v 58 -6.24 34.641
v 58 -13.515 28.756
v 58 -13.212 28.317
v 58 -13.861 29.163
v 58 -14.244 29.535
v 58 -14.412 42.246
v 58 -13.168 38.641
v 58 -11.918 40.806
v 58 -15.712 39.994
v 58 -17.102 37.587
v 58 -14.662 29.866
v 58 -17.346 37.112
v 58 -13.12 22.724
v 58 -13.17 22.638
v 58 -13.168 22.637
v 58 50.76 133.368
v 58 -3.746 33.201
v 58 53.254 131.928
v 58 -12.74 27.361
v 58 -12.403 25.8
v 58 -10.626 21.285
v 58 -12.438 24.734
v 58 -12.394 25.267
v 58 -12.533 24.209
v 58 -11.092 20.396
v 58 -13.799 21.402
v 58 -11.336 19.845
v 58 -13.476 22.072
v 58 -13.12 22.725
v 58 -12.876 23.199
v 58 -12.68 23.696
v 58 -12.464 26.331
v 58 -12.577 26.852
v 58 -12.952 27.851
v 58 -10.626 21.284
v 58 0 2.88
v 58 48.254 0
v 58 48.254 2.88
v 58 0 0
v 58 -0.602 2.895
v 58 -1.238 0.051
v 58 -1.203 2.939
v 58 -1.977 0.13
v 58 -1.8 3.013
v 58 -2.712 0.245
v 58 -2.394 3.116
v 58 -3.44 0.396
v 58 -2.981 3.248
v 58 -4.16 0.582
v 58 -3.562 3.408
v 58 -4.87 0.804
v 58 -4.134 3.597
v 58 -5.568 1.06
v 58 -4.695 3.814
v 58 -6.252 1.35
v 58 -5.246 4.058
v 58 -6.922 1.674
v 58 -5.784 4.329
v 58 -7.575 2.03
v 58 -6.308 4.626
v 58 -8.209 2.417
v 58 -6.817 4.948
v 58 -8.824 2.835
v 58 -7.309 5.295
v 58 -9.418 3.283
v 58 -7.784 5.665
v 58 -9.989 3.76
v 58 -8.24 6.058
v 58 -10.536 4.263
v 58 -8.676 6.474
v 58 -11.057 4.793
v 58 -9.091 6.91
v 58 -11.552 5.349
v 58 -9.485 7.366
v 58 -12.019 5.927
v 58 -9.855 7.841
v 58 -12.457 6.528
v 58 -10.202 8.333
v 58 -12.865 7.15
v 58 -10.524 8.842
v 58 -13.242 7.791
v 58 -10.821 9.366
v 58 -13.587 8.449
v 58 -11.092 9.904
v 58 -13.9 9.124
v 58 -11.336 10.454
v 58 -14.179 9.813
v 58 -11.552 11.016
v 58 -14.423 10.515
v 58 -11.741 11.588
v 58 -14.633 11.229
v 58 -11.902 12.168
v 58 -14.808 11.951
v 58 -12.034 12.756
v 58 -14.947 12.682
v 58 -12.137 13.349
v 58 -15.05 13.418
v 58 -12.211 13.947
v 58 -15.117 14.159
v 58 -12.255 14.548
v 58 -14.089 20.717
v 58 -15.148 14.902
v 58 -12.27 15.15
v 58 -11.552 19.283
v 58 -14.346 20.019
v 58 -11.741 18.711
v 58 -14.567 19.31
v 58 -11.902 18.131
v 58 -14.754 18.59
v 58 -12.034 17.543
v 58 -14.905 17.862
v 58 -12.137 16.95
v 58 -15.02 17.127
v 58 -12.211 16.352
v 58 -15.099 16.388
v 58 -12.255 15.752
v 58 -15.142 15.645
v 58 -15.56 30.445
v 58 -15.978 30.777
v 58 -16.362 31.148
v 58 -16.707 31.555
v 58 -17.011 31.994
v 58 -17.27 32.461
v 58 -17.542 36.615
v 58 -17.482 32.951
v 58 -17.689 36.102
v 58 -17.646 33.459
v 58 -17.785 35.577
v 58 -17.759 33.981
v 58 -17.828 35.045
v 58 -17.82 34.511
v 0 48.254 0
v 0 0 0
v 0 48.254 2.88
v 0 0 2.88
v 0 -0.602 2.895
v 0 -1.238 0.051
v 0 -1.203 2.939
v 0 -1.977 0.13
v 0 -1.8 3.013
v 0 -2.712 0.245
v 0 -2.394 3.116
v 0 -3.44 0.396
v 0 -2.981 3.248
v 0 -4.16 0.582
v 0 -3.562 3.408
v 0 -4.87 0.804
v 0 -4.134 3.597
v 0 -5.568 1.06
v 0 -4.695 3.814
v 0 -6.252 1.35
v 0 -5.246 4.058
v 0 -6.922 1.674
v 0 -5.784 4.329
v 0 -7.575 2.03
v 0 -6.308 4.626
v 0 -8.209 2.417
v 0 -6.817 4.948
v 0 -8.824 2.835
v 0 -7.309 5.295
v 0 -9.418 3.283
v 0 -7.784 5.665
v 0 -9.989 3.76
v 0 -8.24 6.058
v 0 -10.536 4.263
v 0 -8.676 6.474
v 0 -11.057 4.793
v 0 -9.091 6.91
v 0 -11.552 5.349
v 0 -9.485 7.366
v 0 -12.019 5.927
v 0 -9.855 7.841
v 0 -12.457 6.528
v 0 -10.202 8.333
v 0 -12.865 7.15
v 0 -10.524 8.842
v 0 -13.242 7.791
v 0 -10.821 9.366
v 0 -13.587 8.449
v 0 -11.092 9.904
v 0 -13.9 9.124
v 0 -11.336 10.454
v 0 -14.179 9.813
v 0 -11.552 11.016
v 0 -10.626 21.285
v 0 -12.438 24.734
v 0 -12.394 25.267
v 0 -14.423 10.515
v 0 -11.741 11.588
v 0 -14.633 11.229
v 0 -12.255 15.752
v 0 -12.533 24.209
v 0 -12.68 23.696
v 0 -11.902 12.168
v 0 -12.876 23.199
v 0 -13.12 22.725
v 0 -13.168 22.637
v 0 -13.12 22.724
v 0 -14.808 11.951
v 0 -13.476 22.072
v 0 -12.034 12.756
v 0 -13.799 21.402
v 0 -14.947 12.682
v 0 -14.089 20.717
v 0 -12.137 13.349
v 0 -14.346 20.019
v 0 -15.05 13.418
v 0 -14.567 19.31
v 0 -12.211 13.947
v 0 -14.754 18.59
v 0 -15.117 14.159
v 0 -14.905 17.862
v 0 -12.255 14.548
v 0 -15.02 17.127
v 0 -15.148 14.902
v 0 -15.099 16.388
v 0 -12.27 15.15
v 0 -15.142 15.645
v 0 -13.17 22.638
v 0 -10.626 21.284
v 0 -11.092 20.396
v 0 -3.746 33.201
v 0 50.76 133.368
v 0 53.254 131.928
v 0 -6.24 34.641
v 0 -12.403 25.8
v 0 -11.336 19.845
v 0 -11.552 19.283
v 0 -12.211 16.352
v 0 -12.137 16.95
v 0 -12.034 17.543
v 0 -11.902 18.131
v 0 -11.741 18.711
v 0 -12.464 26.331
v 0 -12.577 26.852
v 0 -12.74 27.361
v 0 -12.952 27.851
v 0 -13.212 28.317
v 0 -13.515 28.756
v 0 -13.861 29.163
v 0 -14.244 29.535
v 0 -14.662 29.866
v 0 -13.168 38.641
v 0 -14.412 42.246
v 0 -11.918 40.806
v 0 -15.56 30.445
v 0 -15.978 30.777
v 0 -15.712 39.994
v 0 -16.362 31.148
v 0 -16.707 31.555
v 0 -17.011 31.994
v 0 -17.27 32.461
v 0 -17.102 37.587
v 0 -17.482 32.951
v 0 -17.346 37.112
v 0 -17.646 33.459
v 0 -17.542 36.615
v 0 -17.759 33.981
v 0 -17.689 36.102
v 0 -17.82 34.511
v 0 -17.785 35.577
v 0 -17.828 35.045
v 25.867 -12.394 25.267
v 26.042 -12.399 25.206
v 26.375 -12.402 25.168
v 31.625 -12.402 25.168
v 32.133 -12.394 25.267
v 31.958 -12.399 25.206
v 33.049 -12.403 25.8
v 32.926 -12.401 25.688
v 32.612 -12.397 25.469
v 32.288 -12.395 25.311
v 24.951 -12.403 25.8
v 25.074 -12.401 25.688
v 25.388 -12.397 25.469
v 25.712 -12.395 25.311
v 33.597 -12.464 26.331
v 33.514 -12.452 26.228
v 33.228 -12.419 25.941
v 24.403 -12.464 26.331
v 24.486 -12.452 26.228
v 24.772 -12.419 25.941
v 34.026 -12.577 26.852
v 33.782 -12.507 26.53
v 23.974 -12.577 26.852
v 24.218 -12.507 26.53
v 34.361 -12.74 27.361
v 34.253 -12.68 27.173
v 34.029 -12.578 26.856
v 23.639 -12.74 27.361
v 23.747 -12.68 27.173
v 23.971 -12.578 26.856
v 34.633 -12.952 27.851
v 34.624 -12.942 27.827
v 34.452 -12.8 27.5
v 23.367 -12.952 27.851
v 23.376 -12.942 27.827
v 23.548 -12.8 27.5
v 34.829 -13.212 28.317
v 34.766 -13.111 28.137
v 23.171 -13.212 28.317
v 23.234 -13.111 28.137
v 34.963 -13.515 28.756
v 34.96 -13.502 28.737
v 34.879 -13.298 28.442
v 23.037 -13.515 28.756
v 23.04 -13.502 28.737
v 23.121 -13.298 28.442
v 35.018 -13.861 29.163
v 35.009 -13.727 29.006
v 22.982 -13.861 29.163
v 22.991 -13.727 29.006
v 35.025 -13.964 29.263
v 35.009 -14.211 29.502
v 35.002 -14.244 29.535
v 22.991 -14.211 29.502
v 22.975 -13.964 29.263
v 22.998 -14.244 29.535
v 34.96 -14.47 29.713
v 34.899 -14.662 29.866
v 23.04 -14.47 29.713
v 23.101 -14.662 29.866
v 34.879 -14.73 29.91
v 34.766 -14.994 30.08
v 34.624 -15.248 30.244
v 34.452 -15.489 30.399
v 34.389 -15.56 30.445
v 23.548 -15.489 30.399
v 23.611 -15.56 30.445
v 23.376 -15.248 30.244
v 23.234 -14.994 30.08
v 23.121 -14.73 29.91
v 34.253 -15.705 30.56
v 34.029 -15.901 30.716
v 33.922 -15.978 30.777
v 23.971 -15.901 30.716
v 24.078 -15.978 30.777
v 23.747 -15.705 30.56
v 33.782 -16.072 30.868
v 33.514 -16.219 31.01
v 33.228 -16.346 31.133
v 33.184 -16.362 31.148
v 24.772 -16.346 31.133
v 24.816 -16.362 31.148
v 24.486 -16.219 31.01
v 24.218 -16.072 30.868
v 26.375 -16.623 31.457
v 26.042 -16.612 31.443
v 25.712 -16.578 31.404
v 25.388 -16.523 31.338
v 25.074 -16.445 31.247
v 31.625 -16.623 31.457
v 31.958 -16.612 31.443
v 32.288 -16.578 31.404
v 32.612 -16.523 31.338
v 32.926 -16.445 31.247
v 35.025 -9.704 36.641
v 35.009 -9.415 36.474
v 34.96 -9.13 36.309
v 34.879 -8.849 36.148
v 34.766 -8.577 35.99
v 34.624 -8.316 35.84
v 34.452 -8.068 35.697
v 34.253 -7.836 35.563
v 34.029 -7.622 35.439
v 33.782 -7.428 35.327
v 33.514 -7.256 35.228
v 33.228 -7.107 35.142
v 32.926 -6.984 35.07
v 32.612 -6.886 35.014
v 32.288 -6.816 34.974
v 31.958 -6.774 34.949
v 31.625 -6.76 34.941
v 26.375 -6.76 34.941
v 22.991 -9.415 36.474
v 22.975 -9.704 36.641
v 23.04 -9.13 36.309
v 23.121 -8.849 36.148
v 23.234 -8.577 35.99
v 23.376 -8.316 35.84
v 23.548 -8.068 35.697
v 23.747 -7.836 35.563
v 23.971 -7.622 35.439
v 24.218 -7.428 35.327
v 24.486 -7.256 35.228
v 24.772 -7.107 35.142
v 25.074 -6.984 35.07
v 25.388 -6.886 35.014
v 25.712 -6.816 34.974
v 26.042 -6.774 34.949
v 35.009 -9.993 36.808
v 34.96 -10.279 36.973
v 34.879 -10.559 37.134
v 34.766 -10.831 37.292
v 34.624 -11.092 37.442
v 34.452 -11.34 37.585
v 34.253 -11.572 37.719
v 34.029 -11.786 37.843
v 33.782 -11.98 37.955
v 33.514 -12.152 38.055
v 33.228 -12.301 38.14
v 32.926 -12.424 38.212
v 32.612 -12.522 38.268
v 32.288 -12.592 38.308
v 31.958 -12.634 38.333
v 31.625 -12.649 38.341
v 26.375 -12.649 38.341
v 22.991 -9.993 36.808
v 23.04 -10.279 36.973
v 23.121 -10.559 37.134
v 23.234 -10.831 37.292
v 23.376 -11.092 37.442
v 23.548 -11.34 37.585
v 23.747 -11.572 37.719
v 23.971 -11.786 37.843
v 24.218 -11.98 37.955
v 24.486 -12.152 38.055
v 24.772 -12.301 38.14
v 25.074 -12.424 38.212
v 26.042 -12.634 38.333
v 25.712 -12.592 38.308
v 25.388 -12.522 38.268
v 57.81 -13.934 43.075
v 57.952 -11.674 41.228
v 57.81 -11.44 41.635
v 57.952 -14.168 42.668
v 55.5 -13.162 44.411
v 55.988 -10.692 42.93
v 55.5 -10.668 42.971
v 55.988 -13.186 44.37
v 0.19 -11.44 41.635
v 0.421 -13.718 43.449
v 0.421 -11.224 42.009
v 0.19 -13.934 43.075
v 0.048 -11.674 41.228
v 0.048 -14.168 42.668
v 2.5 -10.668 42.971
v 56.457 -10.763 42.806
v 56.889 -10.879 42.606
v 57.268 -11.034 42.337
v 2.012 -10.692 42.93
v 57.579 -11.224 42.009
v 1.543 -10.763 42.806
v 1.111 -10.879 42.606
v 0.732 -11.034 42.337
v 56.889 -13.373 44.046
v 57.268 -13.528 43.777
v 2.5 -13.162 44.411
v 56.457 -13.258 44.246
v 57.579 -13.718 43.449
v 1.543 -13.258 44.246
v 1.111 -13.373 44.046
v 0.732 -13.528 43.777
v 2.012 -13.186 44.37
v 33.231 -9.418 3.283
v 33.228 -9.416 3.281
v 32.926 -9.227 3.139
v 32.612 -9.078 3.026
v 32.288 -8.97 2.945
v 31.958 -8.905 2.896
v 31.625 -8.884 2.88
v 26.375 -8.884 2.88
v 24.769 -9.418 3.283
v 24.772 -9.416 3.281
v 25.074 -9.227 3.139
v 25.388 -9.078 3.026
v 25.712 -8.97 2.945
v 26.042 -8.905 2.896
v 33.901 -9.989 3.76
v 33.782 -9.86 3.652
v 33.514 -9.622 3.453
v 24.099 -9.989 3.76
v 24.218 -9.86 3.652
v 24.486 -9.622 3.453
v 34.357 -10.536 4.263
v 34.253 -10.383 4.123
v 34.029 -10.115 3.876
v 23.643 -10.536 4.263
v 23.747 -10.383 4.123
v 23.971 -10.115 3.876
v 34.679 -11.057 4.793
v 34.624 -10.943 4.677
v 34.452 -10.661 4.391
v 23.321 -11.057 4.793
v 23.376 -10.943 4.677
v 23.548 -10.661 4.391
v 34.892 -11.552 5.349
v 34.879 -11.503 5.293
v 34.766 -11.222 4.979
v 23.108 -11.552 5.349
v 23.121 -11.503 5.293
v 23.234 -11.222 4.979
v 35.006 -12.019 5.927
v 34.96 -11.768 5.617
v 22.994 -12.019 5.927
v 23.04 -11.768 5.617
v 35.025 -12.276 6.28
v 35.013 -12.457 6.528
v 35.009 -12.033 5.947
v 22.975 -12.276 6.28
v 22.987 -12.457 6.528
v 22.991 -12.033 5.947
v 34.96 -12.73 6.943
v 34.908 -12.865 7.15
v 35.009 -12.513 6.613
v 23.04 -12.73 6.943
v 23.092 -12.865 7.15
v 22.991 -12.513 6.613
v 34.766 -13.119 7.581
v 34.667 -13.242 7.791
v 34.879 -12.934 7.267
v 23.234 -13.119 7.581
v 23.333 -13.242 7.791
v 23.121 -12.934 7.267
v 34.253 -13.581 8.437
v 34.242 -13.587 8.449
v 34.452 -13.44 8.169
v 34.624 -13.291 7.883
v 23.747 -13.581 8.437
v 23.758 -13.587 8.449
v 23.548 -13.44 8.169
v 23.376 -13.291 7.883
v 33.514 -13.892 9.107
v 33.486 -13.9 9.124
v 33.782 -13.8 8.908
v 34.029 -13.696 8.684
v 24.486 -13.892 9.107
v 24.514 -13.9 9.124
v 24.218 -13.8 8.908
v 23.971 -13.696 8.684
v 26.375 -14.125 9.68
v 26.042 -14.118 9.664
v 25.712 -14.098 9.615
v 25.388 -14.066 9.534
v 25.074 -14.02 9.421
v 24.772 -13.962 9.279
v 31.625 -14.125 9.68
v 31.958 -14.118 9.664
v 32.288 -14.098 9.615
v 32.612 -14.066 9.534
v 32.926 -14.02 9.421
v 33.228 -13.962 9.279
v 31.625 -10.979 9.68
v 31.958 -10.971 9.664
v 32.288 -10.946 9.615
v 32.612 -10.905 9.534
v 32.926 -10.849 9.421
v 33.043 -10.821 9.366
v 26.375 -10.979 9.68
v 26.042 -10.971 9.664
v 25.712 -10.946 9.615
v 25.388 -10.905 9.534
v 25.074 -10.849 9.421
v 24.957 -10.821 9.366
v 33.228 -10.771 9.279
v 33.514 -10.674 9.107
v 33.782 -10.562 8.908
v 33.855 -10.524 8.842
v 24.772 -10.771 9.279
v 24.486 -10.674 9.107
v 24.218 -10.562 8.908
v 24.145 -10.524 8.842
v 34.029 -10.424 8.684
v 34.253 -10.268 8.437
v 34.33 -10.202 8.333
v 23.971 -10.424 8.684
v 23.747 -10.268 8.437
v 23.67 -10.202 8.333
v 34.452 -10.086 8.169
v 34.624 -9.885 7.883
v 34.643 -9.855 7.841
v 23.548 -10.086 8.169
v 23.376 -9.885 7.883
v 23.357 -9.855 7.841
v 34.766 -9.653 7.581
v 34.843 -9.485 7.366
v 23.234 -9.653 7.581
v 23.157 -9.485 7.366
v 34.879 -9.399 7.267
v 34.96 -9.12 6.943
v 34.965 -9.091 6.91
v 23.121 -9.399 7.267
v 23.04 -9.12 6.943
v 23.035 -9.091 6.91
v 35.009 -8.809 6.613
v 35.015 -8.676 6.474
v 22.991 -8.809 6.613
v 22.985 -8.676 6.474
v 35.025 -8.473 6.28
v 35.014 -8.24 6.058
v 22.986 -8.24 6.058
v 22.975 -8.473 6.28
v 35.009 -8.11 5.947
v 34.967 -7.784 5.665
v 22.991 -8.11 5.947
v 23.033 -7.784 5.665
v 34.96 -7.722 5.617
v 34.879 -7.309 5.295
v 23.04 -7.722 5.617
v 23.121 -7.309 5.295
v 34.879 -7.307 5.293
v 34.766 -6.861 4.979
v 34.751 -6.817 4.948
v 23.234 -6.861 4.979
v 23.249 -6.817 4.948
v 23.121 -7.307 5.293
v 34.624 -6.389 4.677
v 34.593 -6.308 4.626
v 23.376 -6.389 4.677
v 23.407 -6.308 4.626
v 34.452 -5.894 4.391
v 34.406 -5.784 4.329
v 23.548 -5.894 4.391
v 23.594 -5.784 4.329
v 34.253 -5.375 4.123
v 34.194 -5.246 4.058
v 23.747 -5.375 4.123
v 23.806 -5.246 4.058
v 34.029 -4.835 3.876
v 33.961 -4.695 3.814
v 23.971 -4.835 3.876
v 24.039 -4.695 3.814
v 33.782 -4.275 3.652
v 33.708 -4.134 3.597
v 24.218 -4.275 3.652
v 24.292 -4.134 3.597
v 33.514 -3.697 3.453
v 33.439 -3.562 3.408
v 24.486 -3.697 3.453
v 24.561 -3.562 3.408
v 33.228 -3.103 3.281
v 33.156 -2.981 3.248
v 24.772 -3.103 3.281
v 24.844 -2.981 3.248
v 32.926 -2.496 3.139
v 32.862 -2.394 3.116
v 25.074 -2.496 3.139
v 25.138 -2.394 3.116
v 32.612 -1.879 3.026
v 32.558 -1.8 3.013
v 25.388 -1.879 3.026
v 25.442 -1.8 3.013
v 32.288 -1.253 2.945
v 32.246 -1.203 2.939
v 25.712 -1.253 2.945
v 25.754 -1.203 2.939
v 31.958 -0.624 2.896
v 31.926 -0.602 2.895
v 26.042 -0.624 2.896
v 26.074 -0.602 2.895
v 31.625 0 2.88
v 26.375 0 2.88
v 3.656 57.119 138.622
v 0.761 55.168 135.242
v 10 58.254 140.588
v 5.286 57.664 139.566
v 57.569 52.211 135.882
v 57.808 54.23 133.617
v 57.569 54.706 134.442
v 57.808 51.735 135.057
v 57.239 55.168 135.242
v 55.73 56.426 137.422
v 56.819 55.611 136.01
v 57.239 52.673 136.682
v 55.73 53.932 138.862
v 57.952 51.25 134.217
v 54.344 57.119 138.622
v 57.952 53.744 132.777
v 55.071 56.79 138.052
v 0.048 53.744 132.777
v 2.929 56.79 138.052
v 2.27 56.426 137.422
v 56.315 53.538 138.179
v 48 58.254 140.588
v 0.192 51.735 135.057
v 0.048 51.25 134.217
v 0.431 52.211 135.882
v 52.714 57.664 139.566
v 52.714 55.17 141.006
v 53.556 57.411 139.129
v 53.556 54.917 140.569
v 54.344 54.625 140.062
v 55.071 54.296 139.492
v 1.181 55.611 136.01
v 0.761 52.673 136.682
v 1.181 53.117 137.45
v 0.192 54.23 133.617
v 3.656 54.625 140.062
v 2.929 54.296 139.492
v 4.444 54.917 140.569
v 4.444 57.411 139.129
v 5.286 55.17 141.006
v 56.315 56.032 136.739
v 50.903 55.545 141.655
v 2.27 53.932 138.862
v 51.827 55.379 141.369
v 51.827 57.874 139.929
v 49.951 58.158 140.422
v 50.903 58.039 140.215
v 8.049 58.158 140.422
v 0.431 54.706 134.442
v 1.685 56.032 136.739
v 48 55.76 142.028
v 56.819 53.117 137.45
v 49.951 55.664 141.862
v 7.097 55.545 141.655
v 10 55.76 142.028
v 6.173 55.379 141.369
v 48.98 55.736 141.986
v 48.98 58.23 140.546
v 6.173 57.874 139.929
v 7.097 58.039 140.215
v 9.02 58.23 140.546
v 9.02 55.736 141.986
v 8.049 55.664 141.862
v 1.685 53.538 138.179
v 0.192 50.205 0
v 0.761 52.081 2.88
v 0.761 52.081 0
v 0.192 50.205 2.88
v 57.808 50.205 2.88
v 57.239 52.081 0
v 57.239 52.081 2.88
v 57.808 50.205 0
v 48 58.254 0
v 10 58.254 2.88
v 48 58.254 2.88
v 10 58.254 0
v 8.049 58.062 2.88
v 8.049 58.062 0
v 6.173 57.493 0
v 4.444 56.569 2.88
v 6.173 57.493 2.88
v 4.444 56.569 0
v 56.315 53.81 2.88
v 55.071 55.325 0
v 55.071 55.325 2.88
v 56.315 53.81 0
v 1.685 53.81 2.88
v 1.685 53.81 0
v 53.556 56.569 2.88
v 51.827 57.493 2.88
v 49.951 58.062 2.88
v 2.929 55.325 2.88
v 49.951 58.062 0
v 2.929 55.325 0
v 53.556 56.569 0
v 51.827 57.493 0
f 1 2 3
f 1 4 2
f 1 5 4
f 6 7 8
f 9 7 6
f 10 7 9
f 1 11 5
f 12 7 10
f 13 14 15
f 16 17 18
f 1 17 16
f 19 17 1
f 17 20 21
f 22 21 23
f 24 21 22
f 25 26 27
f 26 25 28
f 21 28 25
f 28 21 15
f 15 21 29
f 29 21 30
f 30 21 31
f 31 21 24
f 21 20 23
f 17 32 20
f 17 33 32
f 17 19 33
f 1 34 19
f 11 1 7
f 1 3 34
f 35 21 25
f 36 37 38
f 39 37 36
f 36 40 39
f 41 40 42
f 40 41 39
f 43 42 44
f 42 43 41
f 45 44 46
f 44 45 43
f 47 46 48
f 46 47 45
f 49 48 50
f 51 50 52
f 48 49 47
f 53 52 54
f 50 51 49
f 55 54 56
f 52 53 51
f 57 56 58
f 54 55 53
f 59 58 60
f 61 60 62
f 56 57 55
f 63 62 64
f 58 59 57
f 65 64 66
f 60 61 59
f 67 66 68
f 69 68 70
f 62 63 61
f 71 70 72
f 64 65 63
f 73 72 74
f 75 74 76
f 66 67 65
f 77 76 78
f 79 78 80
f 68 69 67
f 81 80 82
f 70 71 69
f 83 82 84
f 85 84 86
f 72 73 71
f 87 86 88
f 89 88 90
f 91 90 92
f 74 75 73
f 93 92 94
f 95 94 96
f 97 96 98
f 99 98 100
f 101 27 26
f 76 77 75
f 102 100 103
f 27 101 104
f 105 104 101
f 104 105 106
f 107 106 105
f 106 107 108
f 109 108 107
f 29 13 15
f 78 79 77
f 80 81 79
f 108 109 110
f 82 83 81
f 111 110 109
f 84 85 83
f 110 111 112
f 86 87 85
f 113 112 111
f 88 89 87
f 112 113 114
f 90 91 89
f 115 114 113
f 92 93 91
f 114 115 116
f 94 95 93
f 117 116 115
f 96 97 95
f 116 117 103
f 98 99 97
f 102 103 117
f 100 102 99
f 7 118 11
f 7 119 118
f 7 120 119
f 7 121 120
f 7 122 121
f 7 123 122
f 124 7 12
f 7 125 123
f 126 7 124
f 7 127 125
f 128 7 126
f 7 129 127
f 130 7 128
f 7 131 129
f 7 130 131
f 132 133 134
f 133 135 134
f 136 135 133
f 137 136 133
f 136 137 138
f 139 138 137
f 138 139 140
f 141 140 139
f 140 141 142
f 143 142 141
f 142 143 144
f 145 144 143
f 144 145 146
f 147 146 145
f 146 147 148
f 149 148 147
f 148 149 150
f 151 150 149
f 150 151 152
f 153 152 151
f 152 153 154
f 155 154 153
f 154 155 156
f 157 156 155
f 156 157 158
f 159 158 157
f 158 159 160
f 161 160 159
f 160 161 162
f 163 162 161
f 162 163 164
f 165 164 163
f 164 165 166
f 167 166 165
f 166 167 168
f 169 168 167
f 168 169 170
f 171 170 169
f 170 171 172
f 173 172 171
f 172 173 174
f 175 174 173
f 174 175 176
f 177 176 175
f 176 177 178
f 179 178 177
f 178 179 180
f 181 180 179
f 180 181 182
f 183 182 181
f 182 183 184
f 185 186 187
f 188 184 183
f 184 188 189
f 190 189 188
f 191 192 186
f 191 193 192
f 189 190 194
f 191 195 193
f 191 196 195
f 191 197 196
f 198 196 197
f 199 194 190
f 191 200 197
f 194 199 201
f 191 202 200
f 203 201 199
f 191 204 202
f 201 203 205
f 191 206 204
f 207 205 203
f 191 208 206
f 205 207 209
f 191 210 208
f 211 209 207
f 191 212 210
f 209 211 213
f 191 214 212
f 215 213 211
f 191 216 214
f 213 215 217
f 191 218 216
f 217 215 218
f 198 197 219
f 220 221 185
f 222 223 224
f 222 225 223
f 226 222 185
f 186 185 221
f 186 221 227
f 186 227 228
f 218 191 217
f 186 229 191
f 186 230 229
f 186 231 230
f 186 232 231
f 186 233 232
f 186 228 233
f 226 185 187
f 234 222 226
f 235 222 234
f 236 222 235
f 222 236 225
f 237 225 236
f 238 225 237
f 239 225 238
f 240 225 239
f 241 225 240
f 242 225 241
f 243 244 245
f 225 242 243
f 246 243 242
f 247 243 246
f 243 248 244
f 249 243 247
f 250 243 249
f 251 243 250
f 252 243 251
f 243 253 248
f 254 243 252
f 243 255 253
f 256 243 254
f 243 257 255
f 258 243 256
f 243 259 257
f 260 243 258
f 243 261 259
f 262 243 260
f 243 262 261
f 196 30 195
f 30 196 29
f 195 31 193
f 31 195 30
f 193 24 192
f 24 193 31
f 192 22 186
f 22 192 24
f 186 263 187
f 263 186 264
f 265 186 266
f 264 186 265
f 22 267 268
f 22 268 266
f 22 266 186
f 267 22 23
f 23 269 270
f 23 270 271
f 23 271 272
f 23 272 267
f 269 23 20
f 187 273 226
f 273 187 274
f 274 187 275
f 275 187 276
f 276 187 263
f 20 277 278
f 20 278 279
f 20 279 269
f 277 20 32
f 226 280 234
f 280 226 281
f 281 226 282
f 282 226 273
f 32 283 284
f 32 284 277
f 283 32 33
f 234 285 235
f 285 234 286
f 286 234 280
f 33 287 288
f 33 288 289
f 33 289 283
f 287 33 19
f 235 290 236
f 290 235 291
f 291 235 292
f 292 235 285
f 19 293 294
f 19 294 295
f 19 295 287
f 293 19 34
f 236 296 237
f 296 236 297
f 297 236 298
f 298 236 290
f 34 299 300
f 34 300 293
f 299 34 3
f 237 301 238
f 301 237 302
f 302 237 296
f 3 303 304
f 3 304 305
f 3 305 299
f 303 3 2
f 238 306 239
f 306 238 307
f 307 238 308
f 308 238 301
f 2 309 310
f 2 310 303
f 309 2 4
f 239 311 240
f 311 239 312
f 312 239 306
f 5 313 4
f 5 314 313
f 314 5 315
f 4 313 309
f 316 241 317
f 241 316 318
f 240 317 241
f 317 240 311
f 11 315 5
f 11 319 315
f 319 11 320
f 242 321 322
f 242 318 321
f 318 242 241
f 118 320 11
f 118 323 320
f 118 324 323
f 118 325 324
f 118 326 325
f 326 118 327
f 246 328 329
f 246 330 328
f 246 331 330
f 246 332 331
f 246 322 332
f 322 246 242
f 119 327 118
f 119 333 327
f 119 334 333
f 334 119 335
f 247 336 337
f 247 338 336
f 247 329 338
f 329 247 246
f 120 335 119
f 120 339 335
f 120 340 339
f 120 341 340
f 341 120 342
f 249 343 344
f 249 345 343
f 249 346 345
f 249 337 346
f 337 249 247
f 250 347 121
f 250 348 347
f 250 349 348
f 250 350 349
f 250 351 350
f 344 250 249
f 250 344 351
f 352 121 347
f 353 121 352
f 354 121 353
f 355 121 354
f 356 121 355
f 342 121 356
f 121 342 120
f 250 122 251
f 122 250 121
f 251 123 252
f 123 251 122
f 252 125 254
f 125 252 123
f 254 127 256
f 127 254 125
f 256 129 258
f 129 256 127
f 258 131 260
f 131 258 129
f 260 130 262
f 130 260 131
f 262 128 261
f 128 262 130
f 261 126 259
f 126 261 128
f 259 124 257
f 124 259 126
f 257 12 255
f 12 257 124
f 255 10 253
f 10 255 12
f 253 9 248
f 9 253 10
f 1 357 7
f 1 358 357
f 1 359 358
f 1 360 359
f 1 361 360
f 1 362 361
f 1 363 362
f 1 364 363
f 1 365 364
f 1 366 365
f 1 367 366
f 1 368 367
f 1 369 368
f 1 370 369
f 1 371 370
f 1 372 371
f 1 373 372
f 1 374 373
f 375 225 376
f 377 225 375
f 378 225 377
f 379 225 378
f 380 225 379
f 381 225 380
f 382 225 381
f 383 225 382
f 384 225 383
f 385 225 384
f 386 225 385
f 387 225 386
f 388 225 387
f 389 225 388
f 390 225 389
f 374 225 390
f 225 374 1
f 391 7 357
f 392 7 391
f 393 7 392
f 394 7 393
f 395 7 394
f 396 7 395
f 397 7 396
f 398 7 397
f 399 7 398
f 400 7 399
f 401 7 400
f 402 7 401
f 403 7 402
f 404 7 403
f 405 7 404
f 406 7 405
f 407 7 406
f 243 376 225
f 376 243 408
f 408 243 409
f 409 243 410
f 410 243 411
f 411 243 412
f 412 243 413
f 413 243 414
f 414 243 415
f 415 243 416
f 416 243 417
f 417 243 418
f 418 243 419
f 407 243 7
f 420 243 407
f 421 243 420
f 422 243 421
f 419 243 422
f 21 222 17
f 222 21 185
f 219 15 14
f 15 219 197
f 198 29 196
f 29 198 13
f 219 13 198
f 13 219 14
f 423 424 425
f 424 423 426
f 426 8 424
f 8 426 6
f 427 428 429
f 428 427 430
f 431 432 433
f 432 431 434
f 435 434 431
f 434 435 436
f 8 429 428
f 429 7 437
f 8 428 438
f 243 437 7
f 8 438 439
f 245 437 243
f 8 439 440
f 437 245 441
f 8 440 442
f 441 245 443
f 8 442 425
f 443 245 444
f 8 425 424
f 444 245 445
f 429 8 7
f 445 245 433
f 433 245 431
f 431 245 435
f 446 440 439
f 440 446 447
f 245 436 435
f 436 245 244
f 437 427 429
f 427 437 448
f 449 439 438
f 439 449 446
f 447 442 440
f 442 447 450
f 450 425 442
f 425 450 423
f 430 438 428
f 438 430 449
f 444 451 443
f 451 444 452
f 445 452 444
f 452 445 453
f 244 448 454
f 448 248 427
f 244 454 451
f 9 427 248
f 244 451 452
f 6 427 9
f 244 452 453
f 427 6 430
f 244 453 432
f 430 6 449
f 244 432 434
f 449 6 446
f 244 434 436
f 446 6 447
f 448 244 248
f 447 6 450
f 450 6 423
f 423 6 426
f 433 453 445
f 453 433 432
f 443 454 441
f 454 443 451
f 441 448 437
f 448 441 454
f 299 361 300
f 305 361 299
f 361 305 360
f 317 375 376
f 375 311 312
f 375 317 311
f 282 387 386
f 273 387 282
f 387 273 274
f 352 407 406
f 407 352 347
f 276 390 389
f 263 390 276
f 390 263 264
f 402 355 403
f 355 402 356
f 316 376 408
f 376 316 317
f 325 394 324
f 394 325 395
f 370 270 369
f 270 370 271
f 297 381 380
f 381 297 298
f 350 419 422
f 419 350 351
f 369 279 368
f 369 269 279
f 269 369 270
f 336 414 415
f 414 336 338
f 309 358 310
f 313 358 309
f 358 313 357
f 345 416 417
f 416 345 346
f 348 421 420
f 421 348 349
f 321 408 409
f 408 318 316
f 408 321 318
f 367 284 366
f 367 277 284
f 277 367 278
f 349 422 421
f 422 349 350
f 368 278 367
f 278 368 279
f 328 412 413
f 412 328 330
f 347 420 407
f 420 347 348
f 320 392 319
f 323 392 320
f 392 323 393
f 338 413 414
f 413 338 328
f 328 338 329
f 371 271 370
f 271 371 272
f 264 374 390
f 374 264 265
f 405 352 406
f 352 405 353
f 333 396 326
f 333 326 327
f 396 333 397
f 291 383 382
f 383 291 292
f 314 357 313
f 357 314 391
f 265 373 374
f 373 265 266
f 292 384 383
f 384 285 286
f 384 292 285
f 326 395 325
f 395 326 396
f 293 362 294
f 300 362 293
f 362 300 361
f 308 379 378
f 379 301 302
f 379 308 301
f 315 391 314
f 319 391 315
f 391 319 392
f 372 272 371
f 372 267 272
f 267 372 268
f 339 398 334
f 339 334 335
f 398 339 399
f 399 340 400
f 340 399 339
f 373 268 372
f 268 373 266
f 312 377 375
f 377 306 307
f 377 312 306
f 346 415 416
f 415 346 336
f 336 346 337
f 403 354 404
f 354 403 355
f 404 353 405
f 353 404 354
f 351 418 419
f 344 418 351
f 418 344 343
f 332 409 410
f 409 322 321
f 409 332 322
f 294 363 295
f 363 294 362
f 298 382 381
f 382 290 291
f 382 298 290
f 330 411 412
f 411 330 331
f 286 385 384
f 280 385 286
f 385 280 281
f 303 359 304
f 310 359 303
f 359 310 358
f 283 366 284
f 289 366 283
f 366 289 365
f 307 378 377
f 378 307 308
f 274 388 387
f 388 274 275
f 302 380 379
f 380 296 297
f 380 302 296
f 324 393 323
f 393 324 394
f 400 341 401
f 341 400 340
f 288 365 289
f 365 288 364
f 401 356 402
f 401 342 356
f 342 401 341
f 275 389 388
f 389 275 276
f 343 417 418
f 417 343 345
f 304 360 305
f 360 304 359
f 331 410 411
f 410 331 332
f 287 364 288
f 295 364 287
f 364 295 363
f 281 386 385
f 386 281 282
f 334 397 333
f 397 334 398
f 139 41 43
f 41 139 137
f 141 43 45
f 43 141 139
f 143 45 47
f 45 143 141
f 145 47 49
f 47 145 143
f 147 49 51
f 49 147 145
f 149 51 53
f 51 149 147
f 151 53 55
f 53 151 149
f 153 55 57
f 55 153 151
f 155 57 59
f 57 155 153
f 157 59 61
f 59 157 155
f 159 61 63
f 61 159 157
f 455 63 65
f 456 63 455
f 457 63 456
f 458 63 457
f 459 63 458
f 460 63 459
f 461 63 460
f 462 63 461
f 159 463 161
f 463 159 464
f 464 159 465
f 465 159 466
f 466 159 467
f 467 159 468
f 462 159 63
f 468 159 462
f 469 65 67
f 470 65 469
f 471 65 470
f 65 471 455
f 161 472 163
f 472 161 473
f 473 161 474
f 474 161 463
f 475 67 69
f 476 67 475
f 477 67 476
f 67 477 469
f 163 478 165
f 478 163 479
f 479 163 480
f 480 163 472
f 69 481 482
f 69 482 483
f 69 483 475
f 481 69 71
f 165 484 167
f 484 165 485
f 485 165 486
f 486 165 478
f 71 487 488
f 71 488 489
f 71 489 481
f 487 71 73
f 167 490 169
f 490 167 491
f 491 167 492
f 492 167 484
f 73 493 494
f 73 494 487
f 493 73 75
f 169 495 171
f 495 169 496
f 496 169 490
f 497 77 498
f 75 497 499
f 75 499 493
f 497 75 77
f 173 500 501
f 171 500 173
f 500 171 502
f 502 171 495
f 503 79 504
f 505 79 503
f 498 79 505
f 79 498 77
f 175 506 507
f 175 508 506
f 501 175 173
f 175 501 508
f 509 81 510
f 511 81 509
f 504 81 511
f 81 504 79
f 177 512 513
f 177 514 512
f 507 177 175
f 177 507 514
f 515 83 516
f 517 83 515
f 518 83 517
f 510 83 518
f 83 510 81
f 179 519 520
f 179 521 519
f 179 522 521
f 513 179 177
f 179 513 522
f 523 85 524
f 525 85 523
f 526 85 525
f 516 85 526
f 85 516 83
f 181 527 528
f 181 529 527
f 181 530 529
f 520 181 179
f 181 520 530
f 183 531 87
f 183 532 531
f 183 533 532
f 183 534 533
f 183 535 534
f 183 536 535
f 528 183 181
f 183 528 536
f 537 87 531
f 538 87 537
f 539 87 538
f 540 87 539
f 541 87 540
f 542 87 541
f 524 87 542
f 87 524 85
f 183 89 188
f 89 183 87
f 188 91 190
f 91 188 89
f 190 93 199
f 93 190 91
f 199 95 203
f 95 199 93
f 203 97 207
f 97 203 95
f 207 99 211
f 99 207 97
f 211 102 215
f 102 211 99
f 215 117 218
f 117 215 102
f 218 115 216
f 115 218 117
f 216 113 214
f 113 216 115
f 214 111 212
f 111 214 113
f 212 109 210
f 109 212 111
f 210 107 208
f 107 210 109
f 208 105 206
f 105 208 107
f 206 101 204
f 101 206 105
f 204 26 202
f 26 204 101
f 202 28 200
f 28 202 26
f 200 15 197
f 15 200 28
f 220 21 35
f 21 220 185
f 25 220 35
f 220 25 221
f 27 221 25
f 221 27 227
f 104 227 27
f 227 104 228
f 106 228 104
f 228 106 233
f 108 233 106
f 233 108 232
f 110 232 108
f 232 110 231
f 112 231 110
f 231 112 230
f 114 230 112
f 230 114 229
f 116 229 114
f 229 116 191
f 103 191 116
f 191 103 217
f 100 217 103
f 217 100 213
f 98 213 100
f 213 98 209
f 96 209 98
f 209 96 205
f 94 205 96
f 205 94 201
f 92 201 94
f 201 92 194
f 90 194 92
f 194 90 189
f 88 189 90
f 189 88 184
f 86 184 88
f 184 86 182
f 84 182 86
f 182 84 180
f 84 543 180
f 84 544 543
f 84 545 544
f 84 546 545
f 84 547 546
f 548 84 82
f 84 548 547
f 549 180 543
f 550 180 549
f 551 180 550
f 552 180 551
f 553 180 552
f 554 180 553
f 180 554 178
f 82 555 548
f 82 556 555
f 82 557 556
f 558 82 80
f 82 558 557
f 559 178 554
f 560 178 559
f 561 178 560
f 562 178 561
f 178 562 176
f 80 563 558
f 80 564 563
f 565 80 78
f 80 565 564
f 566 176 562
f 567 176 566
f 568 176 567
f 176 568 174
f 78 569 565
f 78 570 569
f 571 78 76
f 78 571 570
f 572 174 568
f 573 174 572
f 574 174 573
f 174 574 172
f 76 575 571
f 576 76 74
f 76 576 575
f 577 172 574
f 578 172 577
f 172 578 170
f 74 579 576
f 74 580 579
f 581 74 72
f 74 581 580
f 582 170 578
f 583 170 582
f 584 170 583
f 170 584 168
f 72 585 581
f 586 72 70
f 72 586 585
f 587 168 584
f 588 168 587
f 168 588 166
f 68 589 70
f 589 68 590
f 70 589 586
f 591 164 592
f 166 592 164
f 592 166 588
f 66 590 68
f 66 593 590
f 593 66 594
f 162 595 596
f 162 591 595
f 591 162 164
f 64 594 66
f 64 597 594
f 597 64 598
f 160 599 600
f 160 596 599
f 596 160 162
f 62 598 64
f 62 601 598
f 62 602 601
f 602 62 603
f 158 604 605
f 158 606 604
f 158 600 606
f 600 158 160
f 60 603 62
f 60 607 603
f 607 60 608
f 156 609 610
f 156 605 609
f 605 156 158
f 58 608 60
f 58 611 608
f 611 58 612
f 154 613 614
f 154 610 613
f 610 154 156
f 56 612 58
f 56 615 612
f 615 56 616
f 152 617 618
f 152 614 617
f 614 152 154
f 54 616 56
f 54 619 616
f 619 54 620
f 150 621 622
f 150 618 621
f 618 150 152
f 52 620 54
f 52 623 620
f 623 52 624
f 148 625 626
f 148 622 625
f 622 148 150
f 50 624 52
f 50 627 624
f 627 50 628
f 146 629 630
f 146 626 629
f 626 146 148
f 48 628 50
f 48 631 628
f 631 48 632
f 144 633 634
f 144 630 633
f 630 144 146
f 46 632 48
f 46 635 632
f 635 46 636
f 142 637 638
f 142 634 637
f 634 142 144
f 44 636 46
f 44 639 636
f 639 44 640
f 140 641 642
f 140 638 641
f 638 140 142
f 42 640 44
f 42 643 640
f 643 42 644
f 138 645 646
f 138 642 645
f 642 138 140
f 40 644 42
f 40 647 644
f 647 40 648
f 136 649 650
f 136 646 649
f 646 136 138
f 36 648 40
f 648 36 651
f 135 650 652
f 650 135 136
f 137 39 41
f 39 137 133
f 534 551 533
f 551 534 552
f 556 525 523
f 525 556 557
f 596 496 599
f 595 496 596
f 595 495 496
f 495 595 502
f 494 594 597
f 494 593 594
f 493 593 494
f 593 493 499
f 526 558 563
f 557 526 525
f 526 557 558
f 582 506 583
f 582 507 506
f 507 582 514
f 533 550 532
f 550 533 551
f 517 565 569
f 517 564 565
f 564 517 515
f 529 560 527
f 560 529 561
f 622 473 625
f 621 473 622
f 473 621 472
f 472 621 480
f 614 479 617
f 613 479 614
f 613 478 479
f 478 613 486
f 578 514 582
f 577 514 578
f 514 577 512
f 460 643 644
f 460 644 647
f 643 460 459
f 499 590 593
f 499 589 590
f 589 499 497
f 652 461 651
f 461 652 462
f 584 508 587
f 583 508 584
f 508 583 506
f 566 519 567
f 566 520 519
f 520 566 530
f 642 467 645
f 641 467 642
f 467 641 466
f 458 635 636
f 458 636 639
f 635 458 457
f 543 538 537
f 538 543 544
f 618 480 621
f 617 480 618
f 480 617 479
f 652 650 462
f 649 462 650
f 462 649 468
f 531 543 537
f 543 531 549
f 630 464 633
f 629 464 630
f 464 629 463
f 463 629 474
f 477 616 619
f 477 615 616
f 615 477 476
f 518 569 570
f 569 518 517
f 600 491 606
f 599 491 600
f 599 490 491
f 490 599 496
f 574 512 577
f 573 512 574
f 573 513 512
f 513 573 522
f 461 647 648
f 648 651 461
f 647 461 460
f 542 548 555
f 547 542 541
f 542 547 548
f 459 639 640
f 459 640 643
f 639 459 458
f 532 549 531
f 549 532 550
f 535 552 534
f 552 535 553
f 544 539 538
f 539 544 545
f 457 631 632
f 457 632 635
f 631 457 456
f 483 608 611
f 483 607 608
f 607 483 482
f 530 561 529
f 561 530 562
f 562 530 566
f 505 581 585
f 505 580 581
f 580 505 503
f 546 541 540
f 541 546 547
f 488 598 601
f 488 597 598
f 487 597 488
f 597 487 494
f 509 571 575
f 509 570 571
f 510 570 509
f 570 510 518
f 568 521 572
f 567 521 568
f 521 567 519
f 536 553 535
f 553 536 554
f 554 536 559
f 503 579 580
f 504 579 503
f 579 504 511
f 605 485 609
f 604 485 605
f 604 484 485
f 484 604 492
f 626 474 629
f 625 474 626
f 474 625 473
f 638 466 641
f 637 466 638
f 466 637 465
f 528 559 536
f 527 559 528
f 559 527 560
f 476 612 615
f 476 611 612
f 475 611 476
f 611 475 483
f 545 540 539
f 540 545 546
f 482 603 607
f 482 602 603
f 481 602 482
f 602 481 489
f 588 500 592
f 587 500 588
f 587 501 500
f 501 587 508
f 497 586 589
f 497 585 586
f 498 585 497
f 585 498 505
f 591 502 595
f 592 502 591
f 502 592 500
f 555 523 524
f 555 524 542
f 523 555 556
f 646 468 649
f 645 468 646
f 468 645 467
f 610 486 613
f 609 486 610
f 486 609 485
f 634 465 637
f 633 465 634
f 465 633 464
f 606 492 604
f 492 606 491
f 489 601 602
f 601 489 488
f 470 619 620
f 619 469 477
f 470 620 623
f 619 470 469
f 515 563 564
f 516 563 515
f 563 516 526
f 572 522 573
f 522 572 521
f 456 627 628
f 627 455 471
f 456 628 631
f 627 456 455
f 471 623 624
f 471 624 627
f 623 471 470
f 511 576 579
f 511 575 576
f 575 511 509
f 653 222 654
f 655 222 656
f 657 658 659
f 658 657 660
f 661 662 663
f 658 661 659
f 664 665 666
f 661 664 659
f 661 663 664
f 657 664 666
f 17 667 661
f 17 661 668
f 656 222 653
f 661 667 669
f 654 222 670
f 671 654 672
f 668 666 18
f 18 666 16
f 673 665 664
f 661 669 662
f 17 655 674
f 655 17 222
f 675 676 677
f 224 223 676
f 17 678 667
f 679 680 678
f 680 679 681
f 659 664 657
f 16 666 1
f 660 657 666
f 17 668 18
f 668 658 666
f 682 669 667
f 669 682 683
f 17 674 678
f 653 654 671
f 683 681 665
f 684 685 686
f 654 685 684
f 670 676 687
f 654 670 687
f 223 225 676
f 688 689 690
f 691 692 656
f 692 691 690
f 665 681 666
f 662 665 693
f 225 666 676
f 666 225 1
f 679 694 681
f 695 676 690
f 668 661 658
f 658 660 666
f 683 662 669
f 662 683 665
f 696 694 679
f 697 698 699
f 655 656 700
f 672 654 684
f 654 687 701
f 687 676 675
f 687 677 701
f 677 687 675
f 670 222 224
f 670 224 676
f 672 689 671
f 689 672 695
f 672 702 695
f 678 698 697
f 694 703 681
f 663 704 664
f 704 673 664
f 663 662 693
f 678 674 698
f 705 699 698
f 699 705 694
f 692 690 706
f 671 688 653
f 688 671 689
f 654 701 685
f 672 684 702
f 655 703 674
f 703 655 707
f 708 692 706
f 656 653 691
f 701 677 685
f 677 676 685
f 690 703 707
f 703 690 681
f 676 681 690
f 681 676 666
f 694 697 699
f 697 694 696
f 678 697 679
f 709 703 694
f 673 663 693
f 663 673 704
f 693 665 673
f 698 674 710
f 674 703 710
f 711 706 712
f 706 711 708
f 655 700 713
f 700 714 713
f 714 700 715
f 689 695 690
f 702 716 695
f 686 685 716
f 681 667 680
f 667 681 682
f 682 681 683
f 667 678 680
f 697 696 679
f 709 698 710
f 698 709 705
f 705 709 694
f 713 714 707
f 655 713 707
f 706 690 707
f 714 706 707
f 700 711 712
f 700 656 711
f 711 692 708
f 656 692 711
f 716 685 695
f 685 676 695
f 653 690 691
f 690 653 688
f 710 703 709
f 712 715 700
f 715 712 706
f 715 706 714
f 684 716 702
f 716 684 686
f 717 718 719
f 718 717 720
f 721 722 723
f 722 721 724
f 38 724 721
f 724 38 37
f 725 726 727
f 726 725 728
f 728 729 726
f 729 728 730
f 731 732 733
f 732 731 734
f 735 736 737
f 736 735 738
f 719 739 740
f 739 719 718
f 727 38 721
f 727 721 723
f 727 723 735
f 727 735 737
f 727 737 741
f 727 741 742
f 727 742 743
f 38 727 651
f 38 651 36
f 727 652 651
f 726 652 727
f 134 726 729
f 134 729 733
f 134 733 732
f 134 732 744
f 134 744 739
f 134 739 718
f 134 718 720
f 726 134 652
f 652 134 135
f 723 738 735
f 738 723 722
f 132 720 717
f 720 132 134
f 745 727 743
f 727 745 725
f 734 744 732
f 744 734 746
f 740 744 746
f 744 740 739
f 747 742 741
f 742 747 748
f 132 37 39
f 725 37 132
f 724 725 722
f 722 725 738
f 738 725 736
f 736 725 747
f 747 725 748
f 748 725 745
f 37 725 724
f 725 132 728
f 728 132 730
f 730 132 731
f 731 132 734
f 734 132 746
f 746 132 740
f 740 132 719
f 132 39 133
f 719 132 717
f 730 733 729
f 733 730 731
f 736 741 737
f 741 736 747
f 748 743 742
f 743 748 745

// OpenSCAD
/* [Device] */

// Device width
device_width = 58;

// Device height
device_height = 124;

// Device thickess
device_thickness = 8;

/* [Charger] */

// Make charger holes or not
charger_holes = "yes"; // [yes,no]

// Charger plug width
charger_width = 11.25 + 0.8;

// Charger plug height + wire length 
charger_height = 40;

// Charger thickness
charger_thickness = 6 + 0.8;

// Charger position X factor
charger_position_factor_x = 0.5; // [0:0.01:1]

// Charger position Y factor
charger_position_factor_y = 0.5; // [0:0.01:1]

/* [Misc] */

// Thickness of holder
holder_thickness = 2.88;

// Fillet radius for base and foot parts
holder_fillet = 10;

// Holder angle
holder_angle = 30; // [0:0.5:80]

// Factor to cut the base
holder_cut_factor = 0; // [0:0.01:1]

// Arc radius
arc_radius = "default";

// Foot length
foot_length = "default";

/* [Shelf] */

// Shape of shelf 
shelf_shape = "darc"; // [darc,arc,tri]

// Additional shelf height
shelf_additional_height = "default";

// Height of front support (set to zero if you dont want front support)
front_support_height = 5;

// Front support fillet radius
front_support_fillet = "default";

/* [Patterns] */

// Outline for base part
base_pattern_outline = "default";

// Outline for foot part
foot_pattern_outline = "default";

// Base part pattern preset
base_pattern_preset = 0; // [0:1:33]

// Foot part pattern preset
foot_pattern_preset = 0; // [0:1:33]


module holder() {

    charger_position_factors = [charger_position_factor_x, charger_position_factor_y];
    device_dimensions = [device_width,device_height,device_thickness];
    charger_dimensions = [charger_width, charger_height, charger_thickness]; // include wire bending in height

    // Additional height for shelf (if you want flat shelf - set it to 0)
    front_support_fillet_val = front_support_fillet != "default" ? front_support_fillet : front_support_height / 2;
    shelf_additional_height_val = shelf_additional_height != "default" ? shelf_additional_height : device_dimensions[2] + holder_thickness;
    arc_radius_val = arc_radius != "default" ? arc_radius : (charger_dimensions[1] - (holder_thickness + shelf_additional_height_val)) * sin(45 - holder_angle / 2) / sin(45 + holder_angle / 2);
    foot_length_val = foot_length != "default" ? foot_length : (device_dimensions[1] + (holder_thickness + shelf_additional_height_val) - arc_radius_val * sin(90 - holder_angle) / sin(holder_angle)) * cos(90 - holder_angle) + holder_thickness * cos(holder_angle);

    // outline for pattern
    pattern_outlines = [
        base_pattern_outline != "default" ? base_pattern_outline : holder_thickness, 
        foot_pattern_outline != "default" ? foot_pattern_outline : holder_thickness
        ];
    pattern_presets = [base_pattern_preset, foot_pattern_preset];

    module concentric_pattern(d, t) {
        center = [d[0]/2, d[1]/2];
        translate(center, $fa=2, $fs=0.1) {
            for (i = [t:t * 2:max(d[0],d[1])]) {
                difference() {
                    circle(i + t);
                    circle(i);
                }
            }
        }
    }


    module place_grid(d, grid, offsets=true, hex=false) {
        off = offsets ? grid : [d[0] / grid[0], d[1] / grid[1]];
        cnt = [ceil(d[0]/off[0]) + 2, ceil(d[1]/off[1]) + (hex ? 3 : 2)];
        start = [d[0] / 2 - cnt[0]*off[0] / 2, d[1] / 2 - cnt[1]*off[1] / 2];
        for (xi = [0:cnt[0]-1], yi = [0:cnt[1]-1]) {
            translate([xi * off[0] + start[0] + off[0] / 2, yi * off[1] + start[1] + off[1] / 2 - (xi % 2 != 0 && hex ? off[1]/2 : 0)])
                children(); 
        }
    }

    module place_circular(d, r, min_angle) {
        
        c = [d[0]/2,d[1]/2];
        cnt = max(d[0],d[1])/r;
        
        for (ri = [0:cnt-1]) {
            if (ri == 0) {
                
                translate(c) 
                    children();
                
            } else {
                
                rf = ri * r;
                steps = arc_step_count(rf, 360);
                step = 360/steps;
                
                for (a = [0:steps-1])
                    translate([cos(a * step) * rf + c[0], sin(a * step) * rf + c[1]])
                        children();
            }
        }
    }

    module profile(thickness) {
        difference() {
            offset(delta = thickness)
                children();
            children();
        }
    }


    pattern_preset_modes = [
        "n", 
        // ngons + cirle (offset y)    
        "d", "d", "d", "d", "d", "d", "d", "d",
        // ngons + circle (no y offset)
        "d", "d", "d", "d", "d", "d", "d", "d",

        // ngons + cirle (offset y)    
        "i", "i", "i", "i", "i", "i", "i", "i", 
        // ngons + circle (no y offset)
        "i", "i", "i", "i", "i", "i", "i", "i", 
        // concentric
        "i"
    ];
    pattern_preset_thickness = [
        0,
        0,0,0,0,0,0,0,0,
        0,0,0,0,0,0,0,0,
        0,0,0,0,0,0,0,0,
        0,0,0,0,0,0,0,0,
        0.4
    ];

    // i - intersection, d - difference
    pattern_modes = [pattern_preset_modes[pattern_presets[0]], pattern_preset_modes[pattern_presets[1]]]; 

    // useful for text
    pattern_thickness = [pattern_preset_thickness[pattern_presets[0]], pattern_preset_thickness[pattern_presets[1]]];

    module pattern(part, dim) {   
        preset = pattern_presets[part];
        if (preset >= 1 && preset <= 16) {
            
            n = (preset - 1) % 8 + 3;
            r = 5;
                   
            place_grid(dim, [r * 2 + (preset >= 8 ? holder_thickness / 2 : 0), r * 2 + holder_thickness / 2], hex = preset < 8)
                if (n == 9) 
                    rotate(45)
                        ngon(4, r);
                else if (n == 10)
                    circle(r);
                else
                    ngon(n, r);
                
        } else if (preset >= 17 && preset <= 32) {
            
            n = (preset - 17) % 8 + 3;
            r = 12;
            
            place_grid(dim, [r + holder_thickness, r], hex = preset < 8)
                profile(2) {
                    if (n == 9) 
                        rotate(45)
                            ngon(4, r);
                    else if (n == 10)
                        circle(r);
                    else
                        ngon(n, r);
                }
                
        } else if (preset == 33) {
            concentric_pattern(dim, 0.8);
        }
    }

    function radius_x(r) = r[0] == undef ? r : r[0];
    function radius_y(r) = r[1] == undef ? r : r[1];
    function ellipse_perimeter(r) = let(rx = radius_x(r), ry = radius_y(r)) 2 * PI * ((rx == ry) ? rx : sqrt((rx*rx + ry*ry) / 2));
    function arc_step_count(r, a) = $fn > 0 ? a / 360 * $fn : ceil(max(min(a / $fa, ellipse_perimeter(r) / $fs), 5));
    function arc_step(s, e, c) = (e - s) / c;
    function arc_pt(r, a, p) = [cos(a) * radius_x(r) + p[0], sin(a) * radius_y(r) + p[1]];
    function arc_loop_no_close(r, s, e, p, c) = [ for(i = [0 : c-1]) arc_pt(r, s + i * arc_step(s, e, c), p) ];
    function arc_loop(r, s, e, p, c, close = true) = close 
        ? concat(arc_loop_no_close(r,s,e,p,c), [arc_pt(r, e, p)])
        : arc_loop_no_close(r,s,e,p,c);
    function arc(r, s, e, p = [0,0], close = true) = arc_loop(r, s, e, p, arc_step_count(r, abs(e - s)), close);

    function ngon_poly(n, r, p = [0, 0]) = arc_loop_no_close(r, 0, 360, p, n);
    module ngon(n, r) 
        polygon(ngon_poly(n, r));

    module arc_shape(r, s, e, thickness) {
        inner = arc(r - thickness, s, e);
        outer = arc(r, e, s);
        polygon(concat(inner, outer));
    }

    mount_plate_dim = [device_dimensions[0], device_dimensions[1] * (1 - holder_cut_factor), holder_thickness];
    shelf_dim = [device_dimensions[2] + holder_thickness * 2, holder_thickness + shelf_additional_height_val];

    // tolerance to join parts
    union_tolerance = 0.1;

    module square_top_fillet(d, r = 0) {
        if (r == 0) {
            square([d[0], d[1]]);
        } else {
            polygon(concat([[0,0],[d[0],0]],
                arc(r, 0, 90, [d[0] - r, d[1] - r], true),
                arc(r, 90, 180, [r, d[1] - r], true)
            ));
        }
    }

    module charger(height) {
        if (charger_holes == "yes") {
        
            translate([charger_position_factors[0] * device_dimensions[0] + charger_dimensions[2] / 2 - charger_dimensions[0] / 2, 0, holder_thickness + charger_dimensions[2] / 2])
            rotate([-90,0,0])
            hull($fn=64) {
                cylinder(d = charger_dimensions[2], h = height);
                translate([charger_dimensions[0] - charger_dimensions[2], 0, 0]) cylinder(d = charger_dimensions[2], h = height);
            }
            
        }
    }

    module pattern_mode(mode) {
        if (mode == "i") {
            intersection() {
                children(0);
                children(1);
            }
        } else if (mode == "d") {
            difference() {
                children(0);
                children(1);
            }
        } else {
            children();
        }
    }

    module pattern_filled(part, dim, off=[0,0]) {
        linear_extrude(holder_thickness) {
            difference() {
                children();
                offset(-pattern_outlines[part])
                    children();
            }
            translate([pattern_outlines[part] + off[0], pattern_outlines[part] + off[1]]) 
                pattern_mode(pattern_modes[part]) {
                    translate([-pattern_outlines[part] - off[0], -pattern_outlines[part] - off[1]])
                        children();
                    pattern(part, [dim[0] - pattern_outlines[part] * 2, dim[1] - pattern_outlines[part] * 2]);
                }
        }
        
        pt = pattern_thickness[part];
        if (pt > 0) {
            linear_extrude(holder_thickness - pt)
                children();
        }
    }

    module holder_base() {
        pattern_filled(0, [mount_plate_dim[0], mount_plate_dim[1]], [0,shelf_dim[1]])
            translate([0, shelf_dim[1]])
                square_top_fillet(mount_plate_dim, holder_fillet, $fn = 64);        
    }

    module holder_shelf() {
        difference() {
            union() {
                translate([mount_plate_dim[0],0])
                rotate([0,-90,0])
                linear_extrude(mount_plate_dim[0], $fn = 64)
                    polygon(concat(
                        [
                            [0,0], 
                            [0,-union_tolerance],
                            [holder_thickness,-union_tolerance]
                        ],
                        shelf_additional_height_val == 0 || (shelf_shape != "arc" && shelf_shape != "darc") ?
                            [[holder_thickness,0], [shelf_dim[0], shelf_additional_height_val]] :
                        shelf_shape == "arc" ?
                            arc([shelf_dim[0] - holder_thickness, shelf_additional_height_val], 180, 90, [shelf_dim[0], 0]) :
                            concat(
                                arc([(shelf_dim[0] - holder_thickness) / 2, shelf_additional_height_val / 2], 180, 90, [(shelf_dim[0] + holder_thickness) / 2, 0], false),
                                arc([(shelf_dim[0] - holder_thickness) / 2, shelf_additional_height_val / 2], -90, 0, [(shelf_dim[0] + holder_thickness) / 2, shelf_additional_height_val], true)
                            ),
                        [
                            [shelf_dim[0], shelf_dim[1]], 
                            [holder_thickness, shelf_dim[1]], 
                            [holder_thickness, shelf_dim[1] + union_tolerance], 
                            [0, shelf_dim[1] + union_tolerance]
                        ]
                    ));
                    
                if (front_support_height > 0) {
                    translate([0, shelf_dim[1] - union_tolerance, device_dimensions[2] + holder_thickness])
                    linear_extrude(holder_thickness)
                        square_top_fillet([device_dimensions[0], front_support_height + union_tolerance], front_support_fillet_val);
                }
            }
            
            translate([0, 0, charger_position_factors[1] * (device_dimensions[2] - charger_dimensions[2])])
            charger(shelf_dim[1] + front_support_height + 1);
        }
    }

    module holder_foot() {
        dimensions = [mount_plate_dim[0], foot_length_val];
        pattern_filled(1, dimensions) 
            square_top_fillet(dimensions, holder_fillet);
    }
        
    module holder_arc() {
        translate([mount_plate_dim[0], 0, arc_radius_val])
            rotate([90,0,0])
                rotate([0, -90, 0])
                    linear_extrude(mount_plate_dim[0], $fn = 128)
                        arc_shape(arc_radius_val, -90, holder_angle, holder_thickness);
    }

    union() { 

        translate([0,0,arc_radius_val])
        rotate([90 - holder_angle, 0, 0])
        translate([0,0,arc_radius_val - holder_thickness])    
        holder_base();
        
        render()
        difference() {
            
            union() {
                translate([0,0,arc_radius_val])
                rotate([90 - holder_angle, 0, 0])
                translate([0,0,arc_radius_val - holder_thickness])    
                holder_shelf();
                holder_arc();
            }
            
            translate([0, -arc_radius_val - 1, 0])
                charger(arc_radius_val + holder_thickness + 1);
        }
        
        holder_foot();
    }

}

holder();
